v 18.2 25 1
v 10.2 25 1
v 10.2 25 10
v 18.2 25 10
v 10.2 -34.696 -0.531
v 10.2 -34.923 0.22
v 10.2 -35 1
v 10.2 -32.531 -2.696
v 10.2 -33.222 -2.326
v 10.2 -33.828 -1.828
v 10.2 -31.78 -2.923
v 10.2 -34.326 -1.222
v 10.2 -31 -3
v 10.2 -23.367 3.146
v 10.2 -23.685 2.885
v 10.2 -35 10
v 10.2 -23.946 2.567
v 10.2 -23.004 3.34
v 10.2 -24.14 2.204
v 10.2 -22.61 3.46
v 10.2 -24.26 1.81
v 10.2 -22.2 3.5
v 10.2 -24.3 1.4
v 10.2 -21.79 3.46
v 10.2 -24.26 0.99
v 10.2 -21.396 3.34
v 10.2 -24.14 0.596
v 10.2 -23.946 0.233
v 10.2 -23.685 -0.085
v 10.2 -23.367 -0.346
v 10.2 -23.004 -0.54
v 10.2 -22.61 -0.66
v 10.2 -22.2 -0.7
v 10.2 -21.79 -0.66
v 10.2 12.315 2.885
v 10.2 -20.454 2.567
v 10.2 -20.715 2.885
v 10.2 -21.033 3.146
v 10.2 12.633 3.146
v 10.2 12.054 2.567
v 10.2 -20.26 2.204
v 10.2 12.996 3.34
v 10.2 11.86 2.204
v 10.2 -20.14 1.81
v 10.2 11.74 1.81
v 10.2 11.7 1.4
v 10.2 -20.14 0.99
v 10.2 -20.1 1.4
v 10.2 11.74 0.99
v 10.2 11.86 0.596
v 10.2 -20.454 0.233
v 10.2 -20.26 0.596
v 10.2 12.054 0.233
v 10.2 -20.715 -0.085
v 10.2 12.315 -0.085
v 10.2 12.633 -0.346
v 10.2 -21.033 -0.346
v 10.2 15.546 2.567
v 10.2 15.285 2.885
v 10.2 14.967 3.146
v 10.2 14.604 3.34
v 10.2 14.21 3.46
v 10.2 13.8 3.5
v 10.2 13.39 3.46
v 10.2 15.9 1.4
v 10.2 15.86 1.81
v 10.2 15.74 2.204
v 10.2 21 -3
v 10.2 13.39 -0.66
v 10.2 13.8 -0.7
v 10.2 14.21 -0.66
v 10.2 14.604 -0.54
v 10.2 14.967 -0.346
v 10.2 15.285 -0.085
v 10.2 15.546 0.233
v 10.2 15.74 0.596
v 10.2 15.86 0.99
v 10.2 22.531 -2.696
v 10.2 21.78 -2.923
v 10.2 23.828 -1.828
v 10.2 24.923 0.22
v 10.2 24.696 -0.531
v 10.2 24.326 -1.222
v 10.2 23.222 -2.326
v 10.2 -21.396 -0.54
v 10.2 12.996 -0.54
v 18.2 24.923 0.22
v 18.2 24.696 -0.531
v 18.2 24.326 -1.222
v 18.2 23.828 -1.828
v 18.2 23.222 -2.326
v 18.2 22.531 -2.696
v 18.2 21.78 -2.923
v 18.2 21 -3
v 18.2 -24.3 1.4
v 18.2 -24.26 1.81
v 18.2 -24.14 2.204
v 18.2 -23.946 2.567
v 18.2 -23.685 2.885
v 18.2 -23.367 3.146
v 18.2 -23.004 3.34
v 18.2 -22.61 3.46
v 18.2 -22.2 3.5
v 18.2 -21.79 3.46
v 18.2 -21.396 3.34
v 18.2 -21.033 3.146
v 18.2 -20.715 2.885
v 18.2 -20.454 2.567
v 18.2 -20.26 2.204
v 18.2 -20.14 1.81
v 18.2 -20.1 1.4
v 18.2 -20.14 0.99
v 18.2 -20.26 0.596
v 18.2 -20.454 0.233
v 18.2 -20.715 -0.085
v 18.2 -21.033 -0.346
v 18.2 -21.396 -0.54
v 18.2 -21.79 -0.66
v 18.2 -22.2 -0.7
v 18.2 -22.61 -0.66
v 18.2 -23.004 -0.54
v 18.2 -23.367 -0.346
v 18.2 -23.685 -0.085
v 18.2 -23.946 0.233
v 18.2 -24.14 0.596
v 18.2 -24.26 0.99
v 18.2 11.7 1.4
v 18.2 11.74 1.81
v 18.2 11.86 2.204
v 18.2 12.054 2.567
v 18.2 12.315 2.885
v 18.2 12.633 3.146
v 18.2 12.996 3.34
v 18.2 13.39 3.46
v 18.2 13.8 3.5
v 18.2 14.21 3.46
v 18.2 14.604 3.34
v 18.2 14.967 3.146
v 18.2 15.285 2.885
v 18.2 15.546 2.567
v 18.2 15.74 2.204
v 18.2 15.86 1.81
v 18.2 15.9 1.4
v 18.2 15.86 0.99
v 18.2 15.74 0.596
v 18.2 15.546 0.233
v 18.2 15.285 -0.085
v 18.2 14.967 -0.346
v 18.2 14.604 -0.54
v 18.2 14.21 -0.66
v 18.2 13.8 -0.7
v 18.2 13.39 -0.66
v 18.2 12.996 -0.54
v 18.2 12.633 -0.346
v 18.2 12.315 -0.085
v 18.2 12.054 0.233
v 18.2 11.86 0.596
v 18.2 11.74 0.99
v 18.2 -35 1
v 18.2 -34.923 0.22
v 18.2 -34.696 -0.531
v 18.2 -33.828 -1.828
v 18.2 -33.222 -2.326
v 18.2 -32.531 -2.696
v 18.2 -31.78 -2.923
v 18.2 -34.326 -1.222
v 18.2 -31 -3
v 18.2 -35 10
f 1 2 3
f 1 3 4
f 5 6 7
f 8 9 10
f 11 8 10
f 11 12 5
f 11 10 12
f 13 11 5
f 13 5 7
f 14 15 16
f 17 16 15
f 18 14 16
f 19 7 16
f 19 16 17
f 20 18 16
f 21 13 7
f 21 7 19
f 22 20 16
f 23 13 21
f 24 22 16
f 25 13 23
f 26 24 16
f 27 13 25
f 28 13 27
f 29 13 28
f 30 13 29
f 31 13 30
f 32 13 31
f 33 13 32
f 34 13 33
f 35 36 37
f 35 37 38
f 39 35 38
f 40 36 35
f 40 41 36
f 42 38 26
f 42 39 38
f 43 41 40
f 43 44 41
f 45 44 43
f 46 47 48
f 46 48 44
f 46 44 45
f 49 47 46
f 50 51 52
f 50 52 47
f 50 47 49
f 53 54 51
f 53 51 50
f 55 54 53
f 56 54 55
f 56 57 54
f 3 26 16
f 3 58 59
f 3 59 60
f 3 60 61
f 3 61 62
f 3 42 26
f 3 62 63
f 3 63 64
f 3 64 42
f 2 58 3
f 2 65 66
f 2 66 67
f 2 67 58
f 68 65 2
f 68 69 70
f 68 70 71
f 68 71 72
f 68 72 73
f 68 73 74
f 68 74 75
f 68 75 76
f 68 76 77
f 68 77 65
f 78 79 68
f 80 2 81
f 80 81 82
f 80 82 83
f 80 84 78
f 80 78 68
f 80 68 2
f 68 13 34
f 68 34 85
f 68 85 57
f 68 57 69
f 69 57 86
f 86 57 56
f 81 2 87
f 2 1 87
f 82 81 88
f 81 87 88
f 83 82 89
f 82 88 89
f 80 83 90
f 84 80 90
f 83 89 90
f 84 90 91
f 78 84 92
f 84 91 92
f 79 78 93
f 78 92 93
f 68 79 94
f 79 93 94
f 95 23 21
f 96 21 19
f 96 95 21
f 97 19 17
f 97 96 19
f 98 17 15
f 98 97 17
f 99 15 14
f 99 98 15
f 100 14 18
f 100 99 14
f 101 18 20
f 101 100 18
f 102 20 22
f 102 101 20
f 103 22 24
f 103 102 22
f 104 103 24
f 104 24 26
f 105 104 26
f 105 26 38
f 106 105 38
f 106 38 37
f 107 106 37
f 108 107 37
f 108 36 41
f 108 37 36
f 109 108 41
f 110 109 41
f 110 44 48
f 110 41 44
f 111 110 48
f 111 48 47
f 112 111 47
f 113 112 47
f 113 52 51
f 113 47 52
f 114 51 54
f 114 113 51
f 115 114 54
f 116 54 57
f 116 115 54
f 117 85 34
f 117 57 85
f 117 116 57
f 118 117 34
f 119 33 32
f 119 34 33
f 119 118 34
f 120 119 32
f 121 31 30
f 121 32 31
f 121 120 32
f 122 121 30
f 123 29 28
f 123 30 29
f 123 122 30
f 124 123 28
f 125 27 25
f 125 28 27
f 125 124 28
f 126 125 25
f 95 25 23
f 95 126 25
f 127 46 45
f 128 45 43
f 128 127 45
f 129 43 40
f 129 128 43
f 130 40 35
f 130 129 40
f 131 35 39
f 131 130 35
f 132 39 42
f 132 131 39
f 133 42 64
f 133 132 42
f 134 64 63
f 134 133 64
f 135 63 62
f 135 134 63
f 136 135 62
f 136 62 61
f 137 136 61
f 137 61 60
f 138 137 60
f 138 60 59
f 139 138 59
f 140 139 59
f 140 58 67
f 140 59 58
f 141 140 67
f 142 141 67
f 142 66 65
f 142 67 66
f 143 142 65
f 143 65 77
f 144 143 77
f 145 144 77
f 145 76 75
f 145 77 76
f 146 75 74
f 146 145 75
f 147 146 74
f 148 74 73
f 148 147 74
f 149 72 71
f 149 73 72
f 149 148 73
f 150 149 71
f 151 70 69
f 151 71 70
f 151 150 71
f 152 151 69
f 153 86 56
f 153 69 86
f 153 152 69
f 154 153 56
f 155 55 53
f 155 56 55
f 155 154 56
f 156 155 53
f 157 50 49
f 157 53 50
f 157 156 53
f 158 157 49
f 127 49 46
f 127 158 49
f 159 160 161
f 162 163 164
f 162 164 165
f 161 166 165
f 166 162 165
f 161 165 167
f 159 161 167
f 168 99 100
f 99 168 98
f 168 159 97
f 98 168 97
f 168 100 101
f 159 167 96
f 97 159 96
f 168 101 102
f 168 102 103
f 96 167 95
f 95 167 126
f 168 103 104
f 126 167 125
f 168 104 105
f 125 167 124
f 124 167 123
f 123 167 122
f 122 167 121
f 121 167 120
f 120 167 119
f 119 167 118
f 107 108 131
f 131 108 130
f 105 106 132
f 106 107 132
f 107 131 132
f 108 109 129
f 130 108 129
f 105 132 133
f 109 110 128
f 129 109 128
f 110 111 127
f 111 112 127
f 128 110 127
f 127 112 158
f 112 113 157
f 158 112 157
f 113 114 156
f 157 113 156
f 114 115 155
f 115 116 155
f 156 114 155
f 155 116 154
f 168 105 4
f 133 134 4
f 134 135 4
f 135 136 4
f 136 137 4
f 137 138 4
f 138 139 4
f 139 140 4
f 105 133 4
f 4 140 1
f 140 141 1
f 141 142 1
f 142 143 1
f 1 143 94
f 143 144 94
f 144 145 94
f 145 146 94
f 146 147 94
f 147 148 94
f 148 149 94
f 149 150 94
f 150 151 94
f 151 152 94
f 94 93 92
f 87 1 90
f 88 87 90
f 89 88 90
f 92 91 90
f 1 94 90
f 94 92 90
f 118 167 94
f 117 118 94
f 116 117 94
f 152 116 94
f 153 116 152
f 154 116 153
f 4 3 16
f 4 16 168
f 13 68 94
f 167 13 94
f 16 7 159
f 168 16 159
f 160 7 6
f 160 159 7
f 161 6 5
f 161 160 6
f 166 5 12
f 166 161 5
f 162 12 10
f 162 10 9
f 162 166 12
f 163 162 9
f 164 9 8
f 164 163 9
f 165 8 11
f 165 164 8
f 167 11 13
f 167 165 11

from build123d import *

# Parameters (mm, degrees)
SKETCH005_R      = 2.1
EXTRUDE004_DEPTH = 10
BOX011_W         = 8
BOX011_H         = 60
BOX011_DEPTH     = 13
FILLET007_R      = 4


with BuildPart() as cs_cooling_schroud_hole_extrude:
    # Sketch005 (on Face2 of Box011) → Extrude004 (new body)
    with BuildSketch(Plane(origin=(18.2, 17.6, -2.4), x_dir=(0, -1, 0), z_dir=(-1, 0, 0))):
        with Locations((3.8, 3.8)):
            Circle(SKETCH005_R)
        with Locations((39.8, 3.8)):
            Circle(SKETCH005_R)
    extrude(amount=EXTRUDE004_DEPTH)


with BuildPart() as cs_attachment_block:
    # Box011 → Box011 (new body)
    with BuildSketch(Plane(origin=(10.2, -35, -3), x_dir=(1, 0, 0), z_dir=(0, 0, 1))):
        with Locations((4, 30)):
            Rectangle(BOX011_W, BOX011_H)
    extrude(amount=BOX011_DEPTH)

    # Fillet007
    fillet007_edges = [cs_attachment_block.edges().sort_by_distance(p)[0] for p in [
        (14.2, -35, -3),
        (14.2, 25, -3),
    ]]
    fillet(fillet007_edges, radius=FILLET007_R)

    # Cut006: cut cs cooling schroud hole extrude
    add(cs_cooling_schroud_hole_extrude.part, mode=Mode.SUBTRACT)


solid = cs_attachment_block.part
